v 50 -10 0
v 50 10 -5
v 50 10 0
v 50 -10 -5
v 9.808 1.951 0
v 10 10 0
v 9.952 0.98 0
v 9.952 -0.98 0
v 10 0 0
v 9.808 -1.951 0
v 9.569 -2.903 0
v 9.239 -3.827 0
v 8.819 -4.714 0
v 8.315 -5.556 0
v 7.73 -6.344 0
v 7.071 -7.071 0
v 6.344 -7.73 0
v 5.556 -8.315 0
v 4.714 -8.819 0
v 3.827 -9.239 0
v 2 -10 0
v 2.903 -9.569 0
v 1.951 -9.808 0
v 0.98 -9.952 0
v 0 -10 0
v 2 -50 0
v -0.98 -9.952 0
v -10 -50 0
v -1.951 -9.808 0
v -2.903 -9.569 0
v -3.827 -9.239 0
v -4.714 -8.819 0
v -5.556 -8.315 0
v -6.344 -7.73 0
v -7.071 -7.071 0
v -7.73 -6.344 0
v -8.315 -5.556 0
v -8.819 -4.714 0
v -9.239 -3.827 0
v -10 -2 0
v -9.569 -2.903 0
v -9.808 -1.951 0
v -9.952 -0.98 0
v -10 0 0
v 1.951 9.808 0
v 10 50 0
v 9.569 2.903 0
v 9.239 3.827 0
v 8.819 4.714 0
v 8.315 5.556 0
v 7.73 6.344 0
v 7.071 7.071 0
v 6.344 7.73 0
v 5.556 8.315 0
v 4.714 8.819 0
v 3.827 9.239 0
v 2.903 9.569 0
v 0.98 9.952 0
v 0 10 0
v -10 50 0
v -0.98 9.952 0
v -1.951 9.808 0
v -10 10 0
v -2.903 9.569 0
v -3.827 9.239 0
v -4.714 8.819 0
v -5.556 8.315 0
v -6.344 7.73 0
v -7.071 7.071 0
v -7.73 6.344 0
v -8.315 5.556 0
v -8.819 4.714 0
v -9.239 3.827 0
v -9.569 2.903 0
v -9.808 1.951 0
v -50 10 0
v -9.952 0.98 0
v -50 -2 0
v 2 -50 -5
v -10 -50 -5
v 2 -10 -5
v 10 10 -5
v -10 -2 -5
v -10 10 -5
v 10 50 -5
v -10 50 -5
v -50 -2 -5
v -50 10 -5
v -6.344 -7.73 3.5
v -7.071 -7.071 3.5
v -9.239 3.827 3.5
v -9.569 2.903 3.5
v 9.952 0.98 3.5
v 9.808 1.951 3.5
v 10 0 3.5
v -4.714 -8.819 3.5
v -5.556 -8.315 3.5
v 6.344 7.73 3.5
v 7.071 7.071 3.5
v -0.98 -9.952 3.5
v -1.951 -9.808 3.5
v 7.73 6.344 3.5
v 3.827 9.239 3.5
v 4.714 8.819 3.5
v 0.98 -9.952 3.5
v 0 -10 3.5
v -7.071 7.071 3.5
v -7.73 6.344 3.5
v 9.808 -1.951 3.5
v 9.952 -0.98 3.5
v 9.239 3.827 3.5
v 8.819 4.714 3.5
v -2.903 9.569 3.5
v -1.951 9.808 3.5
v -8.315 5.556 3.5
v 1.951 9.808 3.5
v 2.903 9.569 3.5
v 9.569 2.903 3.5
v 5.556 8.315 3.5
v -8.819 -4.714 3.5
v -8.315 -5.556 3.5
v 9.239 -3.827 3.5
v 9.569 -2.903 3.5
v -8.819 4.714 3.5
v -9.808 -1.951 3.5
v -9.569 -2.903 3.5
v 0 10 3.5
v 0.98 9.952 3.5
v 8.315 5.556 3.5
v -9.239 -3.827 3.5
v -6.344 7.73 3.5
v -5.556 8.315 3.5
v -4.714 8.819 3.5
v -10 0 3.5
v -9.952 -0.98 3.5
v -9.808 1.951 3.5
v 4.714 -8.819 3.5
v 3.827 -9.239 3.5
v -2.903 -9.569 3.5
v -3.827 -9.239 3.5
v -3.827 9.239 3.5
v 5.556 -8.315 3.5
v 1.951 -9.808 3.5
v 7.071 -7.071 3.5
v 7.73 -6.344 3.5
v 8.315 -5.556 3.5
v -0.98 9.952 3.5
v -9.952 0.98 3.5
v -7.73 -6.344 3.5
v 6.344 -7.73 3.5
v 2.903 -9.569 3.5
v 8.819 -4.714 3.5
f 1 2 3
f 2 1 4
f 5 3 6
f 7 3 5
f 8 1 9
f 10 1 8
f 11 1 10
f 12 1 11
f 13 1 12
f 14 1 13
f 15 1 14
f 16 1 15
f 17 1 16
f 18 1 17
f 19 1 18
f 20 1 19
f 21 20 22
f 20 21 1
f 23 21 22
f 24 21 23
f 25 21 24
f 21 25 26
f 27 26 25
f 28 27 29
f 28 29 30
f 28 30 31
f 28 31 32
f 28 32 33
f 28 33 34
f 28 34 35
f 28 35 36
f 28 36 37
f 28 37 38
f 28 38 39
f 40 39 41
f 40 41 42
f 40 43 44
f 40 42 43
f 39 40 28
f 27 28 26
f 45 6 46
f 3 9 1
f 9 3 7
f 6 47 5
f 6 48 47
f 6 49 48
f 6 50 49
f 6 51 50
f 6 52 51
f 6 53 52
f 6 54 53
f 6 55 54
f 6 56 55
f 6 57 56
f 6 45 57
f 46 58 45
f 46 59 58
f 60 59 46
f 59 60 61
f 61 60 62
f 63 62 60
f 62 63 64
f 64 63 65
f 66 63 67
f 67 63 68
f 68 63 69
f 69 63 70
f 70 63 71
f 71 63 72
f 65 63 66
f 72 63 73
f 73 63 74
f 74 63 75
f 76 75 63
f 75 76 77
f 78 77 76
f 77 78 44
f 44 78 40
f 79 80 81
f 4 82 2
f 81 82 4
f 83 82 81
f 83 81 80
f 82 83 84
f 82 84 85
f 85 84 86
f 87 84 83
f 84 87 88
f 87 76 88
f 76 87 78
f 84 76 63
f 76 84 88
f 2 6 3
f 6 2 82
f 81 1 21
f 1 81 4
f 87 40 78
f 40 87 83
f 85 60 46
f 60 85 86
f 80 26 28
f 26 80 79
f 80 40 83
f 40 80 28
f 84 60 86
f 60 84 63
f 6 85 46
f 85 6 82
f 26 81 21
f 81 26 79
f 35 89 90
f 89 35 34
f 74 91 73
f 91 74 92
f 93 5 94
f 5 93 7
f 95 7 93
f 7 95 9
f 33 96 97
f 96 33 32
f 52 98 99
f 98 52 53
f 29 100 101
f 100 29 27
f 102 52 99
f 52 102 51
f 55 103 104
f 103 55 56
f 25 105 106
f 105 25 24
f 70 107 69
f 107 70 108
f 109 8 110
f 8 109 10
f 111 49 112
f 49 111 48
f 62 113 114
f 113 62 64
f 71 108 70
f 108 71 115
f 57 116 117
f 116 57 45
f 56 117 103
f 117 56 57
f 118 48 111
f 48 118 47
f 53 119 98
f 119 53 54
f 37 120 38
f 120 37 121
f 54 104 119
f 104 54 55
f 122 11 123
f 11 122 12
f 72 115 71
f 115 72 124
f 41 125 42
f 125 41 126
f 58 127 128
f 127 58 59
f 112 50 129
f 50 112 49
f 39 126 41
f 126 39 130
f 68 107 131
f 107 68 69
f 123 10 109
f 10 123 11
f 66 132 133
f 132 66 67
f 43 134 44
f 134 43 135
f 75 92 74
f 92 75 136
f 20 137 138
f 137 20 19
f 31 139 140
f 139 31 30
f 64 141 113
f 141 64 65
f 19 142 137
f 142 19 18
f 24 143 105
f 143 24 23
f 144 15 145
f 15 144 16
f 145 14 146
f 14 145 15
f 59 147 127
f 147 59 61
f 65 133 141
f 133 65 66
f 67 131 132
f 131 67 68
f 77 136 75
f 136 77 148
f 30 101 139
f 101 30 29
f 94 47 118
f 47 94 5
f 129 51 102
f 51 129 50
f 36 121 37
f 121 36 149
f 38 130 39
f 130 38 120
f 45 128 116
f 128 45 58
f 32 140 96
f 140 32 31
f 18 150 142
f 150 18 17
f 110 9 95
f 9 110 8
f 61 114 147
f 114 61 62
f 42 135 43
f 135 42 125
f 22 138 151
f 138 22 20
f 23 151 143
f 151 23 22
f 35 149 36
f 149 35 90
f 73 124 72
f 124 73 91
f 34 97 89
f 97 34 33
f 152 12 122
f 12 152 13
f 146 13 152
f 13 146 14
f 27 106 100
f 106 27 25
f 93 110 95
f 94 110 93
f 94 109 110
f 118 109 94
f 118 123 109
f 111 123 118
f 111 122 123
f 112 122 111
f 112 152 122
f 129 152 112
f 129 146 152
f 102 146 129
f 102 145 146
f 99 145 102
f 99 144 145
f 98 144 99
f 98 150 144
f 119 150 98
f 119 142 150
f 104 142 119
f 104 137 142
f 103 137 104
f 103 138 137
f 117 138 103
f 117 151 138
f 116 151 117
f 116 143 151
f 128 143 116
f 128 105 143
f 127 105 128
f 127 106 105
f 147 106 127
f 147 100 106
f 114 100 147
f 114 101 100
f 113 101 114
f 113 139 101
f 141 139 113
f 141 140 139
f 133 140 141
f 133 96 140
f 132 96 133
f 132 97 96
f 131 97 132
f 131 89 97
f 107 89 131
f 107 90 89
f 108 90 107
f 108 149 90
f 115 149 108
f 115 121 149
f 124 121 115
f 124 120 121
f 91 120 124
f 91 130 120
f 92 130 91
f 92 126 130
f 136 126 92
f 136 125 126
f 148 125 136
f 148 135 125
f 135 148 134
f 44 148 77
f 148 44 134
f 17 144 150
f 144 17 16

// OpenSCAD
module beveled_rectangle(length, width, height, bevel) {
    difference() {
        cube([length, width, height], center=true);
        translate([-length/2, -width/2, 0])
            cube([length - 2*bevel, width - 2*bevel, height + 1], center=true);
    }
}

module cross_shape(arm_length, arm_width, arm_height, bevel, center_thickness) {
    union() {
        translate([0, 0, -arm_height/2])
            beveled_rectangle(arm_length, arm_width, arm_height, bevel);
        translate([0, 0, -arm_height/2])
            rotate([0, 0, 90])
            beveled_rectangle(arm_length, arm_width, arm_height, bevel);
        translate([0, 0, -center_thickness/2])
            cylinder(h=center_thickness, d=arm_width, $fn=64);
    }
}

cross_shape(100, 20, 5, 2, 7);
